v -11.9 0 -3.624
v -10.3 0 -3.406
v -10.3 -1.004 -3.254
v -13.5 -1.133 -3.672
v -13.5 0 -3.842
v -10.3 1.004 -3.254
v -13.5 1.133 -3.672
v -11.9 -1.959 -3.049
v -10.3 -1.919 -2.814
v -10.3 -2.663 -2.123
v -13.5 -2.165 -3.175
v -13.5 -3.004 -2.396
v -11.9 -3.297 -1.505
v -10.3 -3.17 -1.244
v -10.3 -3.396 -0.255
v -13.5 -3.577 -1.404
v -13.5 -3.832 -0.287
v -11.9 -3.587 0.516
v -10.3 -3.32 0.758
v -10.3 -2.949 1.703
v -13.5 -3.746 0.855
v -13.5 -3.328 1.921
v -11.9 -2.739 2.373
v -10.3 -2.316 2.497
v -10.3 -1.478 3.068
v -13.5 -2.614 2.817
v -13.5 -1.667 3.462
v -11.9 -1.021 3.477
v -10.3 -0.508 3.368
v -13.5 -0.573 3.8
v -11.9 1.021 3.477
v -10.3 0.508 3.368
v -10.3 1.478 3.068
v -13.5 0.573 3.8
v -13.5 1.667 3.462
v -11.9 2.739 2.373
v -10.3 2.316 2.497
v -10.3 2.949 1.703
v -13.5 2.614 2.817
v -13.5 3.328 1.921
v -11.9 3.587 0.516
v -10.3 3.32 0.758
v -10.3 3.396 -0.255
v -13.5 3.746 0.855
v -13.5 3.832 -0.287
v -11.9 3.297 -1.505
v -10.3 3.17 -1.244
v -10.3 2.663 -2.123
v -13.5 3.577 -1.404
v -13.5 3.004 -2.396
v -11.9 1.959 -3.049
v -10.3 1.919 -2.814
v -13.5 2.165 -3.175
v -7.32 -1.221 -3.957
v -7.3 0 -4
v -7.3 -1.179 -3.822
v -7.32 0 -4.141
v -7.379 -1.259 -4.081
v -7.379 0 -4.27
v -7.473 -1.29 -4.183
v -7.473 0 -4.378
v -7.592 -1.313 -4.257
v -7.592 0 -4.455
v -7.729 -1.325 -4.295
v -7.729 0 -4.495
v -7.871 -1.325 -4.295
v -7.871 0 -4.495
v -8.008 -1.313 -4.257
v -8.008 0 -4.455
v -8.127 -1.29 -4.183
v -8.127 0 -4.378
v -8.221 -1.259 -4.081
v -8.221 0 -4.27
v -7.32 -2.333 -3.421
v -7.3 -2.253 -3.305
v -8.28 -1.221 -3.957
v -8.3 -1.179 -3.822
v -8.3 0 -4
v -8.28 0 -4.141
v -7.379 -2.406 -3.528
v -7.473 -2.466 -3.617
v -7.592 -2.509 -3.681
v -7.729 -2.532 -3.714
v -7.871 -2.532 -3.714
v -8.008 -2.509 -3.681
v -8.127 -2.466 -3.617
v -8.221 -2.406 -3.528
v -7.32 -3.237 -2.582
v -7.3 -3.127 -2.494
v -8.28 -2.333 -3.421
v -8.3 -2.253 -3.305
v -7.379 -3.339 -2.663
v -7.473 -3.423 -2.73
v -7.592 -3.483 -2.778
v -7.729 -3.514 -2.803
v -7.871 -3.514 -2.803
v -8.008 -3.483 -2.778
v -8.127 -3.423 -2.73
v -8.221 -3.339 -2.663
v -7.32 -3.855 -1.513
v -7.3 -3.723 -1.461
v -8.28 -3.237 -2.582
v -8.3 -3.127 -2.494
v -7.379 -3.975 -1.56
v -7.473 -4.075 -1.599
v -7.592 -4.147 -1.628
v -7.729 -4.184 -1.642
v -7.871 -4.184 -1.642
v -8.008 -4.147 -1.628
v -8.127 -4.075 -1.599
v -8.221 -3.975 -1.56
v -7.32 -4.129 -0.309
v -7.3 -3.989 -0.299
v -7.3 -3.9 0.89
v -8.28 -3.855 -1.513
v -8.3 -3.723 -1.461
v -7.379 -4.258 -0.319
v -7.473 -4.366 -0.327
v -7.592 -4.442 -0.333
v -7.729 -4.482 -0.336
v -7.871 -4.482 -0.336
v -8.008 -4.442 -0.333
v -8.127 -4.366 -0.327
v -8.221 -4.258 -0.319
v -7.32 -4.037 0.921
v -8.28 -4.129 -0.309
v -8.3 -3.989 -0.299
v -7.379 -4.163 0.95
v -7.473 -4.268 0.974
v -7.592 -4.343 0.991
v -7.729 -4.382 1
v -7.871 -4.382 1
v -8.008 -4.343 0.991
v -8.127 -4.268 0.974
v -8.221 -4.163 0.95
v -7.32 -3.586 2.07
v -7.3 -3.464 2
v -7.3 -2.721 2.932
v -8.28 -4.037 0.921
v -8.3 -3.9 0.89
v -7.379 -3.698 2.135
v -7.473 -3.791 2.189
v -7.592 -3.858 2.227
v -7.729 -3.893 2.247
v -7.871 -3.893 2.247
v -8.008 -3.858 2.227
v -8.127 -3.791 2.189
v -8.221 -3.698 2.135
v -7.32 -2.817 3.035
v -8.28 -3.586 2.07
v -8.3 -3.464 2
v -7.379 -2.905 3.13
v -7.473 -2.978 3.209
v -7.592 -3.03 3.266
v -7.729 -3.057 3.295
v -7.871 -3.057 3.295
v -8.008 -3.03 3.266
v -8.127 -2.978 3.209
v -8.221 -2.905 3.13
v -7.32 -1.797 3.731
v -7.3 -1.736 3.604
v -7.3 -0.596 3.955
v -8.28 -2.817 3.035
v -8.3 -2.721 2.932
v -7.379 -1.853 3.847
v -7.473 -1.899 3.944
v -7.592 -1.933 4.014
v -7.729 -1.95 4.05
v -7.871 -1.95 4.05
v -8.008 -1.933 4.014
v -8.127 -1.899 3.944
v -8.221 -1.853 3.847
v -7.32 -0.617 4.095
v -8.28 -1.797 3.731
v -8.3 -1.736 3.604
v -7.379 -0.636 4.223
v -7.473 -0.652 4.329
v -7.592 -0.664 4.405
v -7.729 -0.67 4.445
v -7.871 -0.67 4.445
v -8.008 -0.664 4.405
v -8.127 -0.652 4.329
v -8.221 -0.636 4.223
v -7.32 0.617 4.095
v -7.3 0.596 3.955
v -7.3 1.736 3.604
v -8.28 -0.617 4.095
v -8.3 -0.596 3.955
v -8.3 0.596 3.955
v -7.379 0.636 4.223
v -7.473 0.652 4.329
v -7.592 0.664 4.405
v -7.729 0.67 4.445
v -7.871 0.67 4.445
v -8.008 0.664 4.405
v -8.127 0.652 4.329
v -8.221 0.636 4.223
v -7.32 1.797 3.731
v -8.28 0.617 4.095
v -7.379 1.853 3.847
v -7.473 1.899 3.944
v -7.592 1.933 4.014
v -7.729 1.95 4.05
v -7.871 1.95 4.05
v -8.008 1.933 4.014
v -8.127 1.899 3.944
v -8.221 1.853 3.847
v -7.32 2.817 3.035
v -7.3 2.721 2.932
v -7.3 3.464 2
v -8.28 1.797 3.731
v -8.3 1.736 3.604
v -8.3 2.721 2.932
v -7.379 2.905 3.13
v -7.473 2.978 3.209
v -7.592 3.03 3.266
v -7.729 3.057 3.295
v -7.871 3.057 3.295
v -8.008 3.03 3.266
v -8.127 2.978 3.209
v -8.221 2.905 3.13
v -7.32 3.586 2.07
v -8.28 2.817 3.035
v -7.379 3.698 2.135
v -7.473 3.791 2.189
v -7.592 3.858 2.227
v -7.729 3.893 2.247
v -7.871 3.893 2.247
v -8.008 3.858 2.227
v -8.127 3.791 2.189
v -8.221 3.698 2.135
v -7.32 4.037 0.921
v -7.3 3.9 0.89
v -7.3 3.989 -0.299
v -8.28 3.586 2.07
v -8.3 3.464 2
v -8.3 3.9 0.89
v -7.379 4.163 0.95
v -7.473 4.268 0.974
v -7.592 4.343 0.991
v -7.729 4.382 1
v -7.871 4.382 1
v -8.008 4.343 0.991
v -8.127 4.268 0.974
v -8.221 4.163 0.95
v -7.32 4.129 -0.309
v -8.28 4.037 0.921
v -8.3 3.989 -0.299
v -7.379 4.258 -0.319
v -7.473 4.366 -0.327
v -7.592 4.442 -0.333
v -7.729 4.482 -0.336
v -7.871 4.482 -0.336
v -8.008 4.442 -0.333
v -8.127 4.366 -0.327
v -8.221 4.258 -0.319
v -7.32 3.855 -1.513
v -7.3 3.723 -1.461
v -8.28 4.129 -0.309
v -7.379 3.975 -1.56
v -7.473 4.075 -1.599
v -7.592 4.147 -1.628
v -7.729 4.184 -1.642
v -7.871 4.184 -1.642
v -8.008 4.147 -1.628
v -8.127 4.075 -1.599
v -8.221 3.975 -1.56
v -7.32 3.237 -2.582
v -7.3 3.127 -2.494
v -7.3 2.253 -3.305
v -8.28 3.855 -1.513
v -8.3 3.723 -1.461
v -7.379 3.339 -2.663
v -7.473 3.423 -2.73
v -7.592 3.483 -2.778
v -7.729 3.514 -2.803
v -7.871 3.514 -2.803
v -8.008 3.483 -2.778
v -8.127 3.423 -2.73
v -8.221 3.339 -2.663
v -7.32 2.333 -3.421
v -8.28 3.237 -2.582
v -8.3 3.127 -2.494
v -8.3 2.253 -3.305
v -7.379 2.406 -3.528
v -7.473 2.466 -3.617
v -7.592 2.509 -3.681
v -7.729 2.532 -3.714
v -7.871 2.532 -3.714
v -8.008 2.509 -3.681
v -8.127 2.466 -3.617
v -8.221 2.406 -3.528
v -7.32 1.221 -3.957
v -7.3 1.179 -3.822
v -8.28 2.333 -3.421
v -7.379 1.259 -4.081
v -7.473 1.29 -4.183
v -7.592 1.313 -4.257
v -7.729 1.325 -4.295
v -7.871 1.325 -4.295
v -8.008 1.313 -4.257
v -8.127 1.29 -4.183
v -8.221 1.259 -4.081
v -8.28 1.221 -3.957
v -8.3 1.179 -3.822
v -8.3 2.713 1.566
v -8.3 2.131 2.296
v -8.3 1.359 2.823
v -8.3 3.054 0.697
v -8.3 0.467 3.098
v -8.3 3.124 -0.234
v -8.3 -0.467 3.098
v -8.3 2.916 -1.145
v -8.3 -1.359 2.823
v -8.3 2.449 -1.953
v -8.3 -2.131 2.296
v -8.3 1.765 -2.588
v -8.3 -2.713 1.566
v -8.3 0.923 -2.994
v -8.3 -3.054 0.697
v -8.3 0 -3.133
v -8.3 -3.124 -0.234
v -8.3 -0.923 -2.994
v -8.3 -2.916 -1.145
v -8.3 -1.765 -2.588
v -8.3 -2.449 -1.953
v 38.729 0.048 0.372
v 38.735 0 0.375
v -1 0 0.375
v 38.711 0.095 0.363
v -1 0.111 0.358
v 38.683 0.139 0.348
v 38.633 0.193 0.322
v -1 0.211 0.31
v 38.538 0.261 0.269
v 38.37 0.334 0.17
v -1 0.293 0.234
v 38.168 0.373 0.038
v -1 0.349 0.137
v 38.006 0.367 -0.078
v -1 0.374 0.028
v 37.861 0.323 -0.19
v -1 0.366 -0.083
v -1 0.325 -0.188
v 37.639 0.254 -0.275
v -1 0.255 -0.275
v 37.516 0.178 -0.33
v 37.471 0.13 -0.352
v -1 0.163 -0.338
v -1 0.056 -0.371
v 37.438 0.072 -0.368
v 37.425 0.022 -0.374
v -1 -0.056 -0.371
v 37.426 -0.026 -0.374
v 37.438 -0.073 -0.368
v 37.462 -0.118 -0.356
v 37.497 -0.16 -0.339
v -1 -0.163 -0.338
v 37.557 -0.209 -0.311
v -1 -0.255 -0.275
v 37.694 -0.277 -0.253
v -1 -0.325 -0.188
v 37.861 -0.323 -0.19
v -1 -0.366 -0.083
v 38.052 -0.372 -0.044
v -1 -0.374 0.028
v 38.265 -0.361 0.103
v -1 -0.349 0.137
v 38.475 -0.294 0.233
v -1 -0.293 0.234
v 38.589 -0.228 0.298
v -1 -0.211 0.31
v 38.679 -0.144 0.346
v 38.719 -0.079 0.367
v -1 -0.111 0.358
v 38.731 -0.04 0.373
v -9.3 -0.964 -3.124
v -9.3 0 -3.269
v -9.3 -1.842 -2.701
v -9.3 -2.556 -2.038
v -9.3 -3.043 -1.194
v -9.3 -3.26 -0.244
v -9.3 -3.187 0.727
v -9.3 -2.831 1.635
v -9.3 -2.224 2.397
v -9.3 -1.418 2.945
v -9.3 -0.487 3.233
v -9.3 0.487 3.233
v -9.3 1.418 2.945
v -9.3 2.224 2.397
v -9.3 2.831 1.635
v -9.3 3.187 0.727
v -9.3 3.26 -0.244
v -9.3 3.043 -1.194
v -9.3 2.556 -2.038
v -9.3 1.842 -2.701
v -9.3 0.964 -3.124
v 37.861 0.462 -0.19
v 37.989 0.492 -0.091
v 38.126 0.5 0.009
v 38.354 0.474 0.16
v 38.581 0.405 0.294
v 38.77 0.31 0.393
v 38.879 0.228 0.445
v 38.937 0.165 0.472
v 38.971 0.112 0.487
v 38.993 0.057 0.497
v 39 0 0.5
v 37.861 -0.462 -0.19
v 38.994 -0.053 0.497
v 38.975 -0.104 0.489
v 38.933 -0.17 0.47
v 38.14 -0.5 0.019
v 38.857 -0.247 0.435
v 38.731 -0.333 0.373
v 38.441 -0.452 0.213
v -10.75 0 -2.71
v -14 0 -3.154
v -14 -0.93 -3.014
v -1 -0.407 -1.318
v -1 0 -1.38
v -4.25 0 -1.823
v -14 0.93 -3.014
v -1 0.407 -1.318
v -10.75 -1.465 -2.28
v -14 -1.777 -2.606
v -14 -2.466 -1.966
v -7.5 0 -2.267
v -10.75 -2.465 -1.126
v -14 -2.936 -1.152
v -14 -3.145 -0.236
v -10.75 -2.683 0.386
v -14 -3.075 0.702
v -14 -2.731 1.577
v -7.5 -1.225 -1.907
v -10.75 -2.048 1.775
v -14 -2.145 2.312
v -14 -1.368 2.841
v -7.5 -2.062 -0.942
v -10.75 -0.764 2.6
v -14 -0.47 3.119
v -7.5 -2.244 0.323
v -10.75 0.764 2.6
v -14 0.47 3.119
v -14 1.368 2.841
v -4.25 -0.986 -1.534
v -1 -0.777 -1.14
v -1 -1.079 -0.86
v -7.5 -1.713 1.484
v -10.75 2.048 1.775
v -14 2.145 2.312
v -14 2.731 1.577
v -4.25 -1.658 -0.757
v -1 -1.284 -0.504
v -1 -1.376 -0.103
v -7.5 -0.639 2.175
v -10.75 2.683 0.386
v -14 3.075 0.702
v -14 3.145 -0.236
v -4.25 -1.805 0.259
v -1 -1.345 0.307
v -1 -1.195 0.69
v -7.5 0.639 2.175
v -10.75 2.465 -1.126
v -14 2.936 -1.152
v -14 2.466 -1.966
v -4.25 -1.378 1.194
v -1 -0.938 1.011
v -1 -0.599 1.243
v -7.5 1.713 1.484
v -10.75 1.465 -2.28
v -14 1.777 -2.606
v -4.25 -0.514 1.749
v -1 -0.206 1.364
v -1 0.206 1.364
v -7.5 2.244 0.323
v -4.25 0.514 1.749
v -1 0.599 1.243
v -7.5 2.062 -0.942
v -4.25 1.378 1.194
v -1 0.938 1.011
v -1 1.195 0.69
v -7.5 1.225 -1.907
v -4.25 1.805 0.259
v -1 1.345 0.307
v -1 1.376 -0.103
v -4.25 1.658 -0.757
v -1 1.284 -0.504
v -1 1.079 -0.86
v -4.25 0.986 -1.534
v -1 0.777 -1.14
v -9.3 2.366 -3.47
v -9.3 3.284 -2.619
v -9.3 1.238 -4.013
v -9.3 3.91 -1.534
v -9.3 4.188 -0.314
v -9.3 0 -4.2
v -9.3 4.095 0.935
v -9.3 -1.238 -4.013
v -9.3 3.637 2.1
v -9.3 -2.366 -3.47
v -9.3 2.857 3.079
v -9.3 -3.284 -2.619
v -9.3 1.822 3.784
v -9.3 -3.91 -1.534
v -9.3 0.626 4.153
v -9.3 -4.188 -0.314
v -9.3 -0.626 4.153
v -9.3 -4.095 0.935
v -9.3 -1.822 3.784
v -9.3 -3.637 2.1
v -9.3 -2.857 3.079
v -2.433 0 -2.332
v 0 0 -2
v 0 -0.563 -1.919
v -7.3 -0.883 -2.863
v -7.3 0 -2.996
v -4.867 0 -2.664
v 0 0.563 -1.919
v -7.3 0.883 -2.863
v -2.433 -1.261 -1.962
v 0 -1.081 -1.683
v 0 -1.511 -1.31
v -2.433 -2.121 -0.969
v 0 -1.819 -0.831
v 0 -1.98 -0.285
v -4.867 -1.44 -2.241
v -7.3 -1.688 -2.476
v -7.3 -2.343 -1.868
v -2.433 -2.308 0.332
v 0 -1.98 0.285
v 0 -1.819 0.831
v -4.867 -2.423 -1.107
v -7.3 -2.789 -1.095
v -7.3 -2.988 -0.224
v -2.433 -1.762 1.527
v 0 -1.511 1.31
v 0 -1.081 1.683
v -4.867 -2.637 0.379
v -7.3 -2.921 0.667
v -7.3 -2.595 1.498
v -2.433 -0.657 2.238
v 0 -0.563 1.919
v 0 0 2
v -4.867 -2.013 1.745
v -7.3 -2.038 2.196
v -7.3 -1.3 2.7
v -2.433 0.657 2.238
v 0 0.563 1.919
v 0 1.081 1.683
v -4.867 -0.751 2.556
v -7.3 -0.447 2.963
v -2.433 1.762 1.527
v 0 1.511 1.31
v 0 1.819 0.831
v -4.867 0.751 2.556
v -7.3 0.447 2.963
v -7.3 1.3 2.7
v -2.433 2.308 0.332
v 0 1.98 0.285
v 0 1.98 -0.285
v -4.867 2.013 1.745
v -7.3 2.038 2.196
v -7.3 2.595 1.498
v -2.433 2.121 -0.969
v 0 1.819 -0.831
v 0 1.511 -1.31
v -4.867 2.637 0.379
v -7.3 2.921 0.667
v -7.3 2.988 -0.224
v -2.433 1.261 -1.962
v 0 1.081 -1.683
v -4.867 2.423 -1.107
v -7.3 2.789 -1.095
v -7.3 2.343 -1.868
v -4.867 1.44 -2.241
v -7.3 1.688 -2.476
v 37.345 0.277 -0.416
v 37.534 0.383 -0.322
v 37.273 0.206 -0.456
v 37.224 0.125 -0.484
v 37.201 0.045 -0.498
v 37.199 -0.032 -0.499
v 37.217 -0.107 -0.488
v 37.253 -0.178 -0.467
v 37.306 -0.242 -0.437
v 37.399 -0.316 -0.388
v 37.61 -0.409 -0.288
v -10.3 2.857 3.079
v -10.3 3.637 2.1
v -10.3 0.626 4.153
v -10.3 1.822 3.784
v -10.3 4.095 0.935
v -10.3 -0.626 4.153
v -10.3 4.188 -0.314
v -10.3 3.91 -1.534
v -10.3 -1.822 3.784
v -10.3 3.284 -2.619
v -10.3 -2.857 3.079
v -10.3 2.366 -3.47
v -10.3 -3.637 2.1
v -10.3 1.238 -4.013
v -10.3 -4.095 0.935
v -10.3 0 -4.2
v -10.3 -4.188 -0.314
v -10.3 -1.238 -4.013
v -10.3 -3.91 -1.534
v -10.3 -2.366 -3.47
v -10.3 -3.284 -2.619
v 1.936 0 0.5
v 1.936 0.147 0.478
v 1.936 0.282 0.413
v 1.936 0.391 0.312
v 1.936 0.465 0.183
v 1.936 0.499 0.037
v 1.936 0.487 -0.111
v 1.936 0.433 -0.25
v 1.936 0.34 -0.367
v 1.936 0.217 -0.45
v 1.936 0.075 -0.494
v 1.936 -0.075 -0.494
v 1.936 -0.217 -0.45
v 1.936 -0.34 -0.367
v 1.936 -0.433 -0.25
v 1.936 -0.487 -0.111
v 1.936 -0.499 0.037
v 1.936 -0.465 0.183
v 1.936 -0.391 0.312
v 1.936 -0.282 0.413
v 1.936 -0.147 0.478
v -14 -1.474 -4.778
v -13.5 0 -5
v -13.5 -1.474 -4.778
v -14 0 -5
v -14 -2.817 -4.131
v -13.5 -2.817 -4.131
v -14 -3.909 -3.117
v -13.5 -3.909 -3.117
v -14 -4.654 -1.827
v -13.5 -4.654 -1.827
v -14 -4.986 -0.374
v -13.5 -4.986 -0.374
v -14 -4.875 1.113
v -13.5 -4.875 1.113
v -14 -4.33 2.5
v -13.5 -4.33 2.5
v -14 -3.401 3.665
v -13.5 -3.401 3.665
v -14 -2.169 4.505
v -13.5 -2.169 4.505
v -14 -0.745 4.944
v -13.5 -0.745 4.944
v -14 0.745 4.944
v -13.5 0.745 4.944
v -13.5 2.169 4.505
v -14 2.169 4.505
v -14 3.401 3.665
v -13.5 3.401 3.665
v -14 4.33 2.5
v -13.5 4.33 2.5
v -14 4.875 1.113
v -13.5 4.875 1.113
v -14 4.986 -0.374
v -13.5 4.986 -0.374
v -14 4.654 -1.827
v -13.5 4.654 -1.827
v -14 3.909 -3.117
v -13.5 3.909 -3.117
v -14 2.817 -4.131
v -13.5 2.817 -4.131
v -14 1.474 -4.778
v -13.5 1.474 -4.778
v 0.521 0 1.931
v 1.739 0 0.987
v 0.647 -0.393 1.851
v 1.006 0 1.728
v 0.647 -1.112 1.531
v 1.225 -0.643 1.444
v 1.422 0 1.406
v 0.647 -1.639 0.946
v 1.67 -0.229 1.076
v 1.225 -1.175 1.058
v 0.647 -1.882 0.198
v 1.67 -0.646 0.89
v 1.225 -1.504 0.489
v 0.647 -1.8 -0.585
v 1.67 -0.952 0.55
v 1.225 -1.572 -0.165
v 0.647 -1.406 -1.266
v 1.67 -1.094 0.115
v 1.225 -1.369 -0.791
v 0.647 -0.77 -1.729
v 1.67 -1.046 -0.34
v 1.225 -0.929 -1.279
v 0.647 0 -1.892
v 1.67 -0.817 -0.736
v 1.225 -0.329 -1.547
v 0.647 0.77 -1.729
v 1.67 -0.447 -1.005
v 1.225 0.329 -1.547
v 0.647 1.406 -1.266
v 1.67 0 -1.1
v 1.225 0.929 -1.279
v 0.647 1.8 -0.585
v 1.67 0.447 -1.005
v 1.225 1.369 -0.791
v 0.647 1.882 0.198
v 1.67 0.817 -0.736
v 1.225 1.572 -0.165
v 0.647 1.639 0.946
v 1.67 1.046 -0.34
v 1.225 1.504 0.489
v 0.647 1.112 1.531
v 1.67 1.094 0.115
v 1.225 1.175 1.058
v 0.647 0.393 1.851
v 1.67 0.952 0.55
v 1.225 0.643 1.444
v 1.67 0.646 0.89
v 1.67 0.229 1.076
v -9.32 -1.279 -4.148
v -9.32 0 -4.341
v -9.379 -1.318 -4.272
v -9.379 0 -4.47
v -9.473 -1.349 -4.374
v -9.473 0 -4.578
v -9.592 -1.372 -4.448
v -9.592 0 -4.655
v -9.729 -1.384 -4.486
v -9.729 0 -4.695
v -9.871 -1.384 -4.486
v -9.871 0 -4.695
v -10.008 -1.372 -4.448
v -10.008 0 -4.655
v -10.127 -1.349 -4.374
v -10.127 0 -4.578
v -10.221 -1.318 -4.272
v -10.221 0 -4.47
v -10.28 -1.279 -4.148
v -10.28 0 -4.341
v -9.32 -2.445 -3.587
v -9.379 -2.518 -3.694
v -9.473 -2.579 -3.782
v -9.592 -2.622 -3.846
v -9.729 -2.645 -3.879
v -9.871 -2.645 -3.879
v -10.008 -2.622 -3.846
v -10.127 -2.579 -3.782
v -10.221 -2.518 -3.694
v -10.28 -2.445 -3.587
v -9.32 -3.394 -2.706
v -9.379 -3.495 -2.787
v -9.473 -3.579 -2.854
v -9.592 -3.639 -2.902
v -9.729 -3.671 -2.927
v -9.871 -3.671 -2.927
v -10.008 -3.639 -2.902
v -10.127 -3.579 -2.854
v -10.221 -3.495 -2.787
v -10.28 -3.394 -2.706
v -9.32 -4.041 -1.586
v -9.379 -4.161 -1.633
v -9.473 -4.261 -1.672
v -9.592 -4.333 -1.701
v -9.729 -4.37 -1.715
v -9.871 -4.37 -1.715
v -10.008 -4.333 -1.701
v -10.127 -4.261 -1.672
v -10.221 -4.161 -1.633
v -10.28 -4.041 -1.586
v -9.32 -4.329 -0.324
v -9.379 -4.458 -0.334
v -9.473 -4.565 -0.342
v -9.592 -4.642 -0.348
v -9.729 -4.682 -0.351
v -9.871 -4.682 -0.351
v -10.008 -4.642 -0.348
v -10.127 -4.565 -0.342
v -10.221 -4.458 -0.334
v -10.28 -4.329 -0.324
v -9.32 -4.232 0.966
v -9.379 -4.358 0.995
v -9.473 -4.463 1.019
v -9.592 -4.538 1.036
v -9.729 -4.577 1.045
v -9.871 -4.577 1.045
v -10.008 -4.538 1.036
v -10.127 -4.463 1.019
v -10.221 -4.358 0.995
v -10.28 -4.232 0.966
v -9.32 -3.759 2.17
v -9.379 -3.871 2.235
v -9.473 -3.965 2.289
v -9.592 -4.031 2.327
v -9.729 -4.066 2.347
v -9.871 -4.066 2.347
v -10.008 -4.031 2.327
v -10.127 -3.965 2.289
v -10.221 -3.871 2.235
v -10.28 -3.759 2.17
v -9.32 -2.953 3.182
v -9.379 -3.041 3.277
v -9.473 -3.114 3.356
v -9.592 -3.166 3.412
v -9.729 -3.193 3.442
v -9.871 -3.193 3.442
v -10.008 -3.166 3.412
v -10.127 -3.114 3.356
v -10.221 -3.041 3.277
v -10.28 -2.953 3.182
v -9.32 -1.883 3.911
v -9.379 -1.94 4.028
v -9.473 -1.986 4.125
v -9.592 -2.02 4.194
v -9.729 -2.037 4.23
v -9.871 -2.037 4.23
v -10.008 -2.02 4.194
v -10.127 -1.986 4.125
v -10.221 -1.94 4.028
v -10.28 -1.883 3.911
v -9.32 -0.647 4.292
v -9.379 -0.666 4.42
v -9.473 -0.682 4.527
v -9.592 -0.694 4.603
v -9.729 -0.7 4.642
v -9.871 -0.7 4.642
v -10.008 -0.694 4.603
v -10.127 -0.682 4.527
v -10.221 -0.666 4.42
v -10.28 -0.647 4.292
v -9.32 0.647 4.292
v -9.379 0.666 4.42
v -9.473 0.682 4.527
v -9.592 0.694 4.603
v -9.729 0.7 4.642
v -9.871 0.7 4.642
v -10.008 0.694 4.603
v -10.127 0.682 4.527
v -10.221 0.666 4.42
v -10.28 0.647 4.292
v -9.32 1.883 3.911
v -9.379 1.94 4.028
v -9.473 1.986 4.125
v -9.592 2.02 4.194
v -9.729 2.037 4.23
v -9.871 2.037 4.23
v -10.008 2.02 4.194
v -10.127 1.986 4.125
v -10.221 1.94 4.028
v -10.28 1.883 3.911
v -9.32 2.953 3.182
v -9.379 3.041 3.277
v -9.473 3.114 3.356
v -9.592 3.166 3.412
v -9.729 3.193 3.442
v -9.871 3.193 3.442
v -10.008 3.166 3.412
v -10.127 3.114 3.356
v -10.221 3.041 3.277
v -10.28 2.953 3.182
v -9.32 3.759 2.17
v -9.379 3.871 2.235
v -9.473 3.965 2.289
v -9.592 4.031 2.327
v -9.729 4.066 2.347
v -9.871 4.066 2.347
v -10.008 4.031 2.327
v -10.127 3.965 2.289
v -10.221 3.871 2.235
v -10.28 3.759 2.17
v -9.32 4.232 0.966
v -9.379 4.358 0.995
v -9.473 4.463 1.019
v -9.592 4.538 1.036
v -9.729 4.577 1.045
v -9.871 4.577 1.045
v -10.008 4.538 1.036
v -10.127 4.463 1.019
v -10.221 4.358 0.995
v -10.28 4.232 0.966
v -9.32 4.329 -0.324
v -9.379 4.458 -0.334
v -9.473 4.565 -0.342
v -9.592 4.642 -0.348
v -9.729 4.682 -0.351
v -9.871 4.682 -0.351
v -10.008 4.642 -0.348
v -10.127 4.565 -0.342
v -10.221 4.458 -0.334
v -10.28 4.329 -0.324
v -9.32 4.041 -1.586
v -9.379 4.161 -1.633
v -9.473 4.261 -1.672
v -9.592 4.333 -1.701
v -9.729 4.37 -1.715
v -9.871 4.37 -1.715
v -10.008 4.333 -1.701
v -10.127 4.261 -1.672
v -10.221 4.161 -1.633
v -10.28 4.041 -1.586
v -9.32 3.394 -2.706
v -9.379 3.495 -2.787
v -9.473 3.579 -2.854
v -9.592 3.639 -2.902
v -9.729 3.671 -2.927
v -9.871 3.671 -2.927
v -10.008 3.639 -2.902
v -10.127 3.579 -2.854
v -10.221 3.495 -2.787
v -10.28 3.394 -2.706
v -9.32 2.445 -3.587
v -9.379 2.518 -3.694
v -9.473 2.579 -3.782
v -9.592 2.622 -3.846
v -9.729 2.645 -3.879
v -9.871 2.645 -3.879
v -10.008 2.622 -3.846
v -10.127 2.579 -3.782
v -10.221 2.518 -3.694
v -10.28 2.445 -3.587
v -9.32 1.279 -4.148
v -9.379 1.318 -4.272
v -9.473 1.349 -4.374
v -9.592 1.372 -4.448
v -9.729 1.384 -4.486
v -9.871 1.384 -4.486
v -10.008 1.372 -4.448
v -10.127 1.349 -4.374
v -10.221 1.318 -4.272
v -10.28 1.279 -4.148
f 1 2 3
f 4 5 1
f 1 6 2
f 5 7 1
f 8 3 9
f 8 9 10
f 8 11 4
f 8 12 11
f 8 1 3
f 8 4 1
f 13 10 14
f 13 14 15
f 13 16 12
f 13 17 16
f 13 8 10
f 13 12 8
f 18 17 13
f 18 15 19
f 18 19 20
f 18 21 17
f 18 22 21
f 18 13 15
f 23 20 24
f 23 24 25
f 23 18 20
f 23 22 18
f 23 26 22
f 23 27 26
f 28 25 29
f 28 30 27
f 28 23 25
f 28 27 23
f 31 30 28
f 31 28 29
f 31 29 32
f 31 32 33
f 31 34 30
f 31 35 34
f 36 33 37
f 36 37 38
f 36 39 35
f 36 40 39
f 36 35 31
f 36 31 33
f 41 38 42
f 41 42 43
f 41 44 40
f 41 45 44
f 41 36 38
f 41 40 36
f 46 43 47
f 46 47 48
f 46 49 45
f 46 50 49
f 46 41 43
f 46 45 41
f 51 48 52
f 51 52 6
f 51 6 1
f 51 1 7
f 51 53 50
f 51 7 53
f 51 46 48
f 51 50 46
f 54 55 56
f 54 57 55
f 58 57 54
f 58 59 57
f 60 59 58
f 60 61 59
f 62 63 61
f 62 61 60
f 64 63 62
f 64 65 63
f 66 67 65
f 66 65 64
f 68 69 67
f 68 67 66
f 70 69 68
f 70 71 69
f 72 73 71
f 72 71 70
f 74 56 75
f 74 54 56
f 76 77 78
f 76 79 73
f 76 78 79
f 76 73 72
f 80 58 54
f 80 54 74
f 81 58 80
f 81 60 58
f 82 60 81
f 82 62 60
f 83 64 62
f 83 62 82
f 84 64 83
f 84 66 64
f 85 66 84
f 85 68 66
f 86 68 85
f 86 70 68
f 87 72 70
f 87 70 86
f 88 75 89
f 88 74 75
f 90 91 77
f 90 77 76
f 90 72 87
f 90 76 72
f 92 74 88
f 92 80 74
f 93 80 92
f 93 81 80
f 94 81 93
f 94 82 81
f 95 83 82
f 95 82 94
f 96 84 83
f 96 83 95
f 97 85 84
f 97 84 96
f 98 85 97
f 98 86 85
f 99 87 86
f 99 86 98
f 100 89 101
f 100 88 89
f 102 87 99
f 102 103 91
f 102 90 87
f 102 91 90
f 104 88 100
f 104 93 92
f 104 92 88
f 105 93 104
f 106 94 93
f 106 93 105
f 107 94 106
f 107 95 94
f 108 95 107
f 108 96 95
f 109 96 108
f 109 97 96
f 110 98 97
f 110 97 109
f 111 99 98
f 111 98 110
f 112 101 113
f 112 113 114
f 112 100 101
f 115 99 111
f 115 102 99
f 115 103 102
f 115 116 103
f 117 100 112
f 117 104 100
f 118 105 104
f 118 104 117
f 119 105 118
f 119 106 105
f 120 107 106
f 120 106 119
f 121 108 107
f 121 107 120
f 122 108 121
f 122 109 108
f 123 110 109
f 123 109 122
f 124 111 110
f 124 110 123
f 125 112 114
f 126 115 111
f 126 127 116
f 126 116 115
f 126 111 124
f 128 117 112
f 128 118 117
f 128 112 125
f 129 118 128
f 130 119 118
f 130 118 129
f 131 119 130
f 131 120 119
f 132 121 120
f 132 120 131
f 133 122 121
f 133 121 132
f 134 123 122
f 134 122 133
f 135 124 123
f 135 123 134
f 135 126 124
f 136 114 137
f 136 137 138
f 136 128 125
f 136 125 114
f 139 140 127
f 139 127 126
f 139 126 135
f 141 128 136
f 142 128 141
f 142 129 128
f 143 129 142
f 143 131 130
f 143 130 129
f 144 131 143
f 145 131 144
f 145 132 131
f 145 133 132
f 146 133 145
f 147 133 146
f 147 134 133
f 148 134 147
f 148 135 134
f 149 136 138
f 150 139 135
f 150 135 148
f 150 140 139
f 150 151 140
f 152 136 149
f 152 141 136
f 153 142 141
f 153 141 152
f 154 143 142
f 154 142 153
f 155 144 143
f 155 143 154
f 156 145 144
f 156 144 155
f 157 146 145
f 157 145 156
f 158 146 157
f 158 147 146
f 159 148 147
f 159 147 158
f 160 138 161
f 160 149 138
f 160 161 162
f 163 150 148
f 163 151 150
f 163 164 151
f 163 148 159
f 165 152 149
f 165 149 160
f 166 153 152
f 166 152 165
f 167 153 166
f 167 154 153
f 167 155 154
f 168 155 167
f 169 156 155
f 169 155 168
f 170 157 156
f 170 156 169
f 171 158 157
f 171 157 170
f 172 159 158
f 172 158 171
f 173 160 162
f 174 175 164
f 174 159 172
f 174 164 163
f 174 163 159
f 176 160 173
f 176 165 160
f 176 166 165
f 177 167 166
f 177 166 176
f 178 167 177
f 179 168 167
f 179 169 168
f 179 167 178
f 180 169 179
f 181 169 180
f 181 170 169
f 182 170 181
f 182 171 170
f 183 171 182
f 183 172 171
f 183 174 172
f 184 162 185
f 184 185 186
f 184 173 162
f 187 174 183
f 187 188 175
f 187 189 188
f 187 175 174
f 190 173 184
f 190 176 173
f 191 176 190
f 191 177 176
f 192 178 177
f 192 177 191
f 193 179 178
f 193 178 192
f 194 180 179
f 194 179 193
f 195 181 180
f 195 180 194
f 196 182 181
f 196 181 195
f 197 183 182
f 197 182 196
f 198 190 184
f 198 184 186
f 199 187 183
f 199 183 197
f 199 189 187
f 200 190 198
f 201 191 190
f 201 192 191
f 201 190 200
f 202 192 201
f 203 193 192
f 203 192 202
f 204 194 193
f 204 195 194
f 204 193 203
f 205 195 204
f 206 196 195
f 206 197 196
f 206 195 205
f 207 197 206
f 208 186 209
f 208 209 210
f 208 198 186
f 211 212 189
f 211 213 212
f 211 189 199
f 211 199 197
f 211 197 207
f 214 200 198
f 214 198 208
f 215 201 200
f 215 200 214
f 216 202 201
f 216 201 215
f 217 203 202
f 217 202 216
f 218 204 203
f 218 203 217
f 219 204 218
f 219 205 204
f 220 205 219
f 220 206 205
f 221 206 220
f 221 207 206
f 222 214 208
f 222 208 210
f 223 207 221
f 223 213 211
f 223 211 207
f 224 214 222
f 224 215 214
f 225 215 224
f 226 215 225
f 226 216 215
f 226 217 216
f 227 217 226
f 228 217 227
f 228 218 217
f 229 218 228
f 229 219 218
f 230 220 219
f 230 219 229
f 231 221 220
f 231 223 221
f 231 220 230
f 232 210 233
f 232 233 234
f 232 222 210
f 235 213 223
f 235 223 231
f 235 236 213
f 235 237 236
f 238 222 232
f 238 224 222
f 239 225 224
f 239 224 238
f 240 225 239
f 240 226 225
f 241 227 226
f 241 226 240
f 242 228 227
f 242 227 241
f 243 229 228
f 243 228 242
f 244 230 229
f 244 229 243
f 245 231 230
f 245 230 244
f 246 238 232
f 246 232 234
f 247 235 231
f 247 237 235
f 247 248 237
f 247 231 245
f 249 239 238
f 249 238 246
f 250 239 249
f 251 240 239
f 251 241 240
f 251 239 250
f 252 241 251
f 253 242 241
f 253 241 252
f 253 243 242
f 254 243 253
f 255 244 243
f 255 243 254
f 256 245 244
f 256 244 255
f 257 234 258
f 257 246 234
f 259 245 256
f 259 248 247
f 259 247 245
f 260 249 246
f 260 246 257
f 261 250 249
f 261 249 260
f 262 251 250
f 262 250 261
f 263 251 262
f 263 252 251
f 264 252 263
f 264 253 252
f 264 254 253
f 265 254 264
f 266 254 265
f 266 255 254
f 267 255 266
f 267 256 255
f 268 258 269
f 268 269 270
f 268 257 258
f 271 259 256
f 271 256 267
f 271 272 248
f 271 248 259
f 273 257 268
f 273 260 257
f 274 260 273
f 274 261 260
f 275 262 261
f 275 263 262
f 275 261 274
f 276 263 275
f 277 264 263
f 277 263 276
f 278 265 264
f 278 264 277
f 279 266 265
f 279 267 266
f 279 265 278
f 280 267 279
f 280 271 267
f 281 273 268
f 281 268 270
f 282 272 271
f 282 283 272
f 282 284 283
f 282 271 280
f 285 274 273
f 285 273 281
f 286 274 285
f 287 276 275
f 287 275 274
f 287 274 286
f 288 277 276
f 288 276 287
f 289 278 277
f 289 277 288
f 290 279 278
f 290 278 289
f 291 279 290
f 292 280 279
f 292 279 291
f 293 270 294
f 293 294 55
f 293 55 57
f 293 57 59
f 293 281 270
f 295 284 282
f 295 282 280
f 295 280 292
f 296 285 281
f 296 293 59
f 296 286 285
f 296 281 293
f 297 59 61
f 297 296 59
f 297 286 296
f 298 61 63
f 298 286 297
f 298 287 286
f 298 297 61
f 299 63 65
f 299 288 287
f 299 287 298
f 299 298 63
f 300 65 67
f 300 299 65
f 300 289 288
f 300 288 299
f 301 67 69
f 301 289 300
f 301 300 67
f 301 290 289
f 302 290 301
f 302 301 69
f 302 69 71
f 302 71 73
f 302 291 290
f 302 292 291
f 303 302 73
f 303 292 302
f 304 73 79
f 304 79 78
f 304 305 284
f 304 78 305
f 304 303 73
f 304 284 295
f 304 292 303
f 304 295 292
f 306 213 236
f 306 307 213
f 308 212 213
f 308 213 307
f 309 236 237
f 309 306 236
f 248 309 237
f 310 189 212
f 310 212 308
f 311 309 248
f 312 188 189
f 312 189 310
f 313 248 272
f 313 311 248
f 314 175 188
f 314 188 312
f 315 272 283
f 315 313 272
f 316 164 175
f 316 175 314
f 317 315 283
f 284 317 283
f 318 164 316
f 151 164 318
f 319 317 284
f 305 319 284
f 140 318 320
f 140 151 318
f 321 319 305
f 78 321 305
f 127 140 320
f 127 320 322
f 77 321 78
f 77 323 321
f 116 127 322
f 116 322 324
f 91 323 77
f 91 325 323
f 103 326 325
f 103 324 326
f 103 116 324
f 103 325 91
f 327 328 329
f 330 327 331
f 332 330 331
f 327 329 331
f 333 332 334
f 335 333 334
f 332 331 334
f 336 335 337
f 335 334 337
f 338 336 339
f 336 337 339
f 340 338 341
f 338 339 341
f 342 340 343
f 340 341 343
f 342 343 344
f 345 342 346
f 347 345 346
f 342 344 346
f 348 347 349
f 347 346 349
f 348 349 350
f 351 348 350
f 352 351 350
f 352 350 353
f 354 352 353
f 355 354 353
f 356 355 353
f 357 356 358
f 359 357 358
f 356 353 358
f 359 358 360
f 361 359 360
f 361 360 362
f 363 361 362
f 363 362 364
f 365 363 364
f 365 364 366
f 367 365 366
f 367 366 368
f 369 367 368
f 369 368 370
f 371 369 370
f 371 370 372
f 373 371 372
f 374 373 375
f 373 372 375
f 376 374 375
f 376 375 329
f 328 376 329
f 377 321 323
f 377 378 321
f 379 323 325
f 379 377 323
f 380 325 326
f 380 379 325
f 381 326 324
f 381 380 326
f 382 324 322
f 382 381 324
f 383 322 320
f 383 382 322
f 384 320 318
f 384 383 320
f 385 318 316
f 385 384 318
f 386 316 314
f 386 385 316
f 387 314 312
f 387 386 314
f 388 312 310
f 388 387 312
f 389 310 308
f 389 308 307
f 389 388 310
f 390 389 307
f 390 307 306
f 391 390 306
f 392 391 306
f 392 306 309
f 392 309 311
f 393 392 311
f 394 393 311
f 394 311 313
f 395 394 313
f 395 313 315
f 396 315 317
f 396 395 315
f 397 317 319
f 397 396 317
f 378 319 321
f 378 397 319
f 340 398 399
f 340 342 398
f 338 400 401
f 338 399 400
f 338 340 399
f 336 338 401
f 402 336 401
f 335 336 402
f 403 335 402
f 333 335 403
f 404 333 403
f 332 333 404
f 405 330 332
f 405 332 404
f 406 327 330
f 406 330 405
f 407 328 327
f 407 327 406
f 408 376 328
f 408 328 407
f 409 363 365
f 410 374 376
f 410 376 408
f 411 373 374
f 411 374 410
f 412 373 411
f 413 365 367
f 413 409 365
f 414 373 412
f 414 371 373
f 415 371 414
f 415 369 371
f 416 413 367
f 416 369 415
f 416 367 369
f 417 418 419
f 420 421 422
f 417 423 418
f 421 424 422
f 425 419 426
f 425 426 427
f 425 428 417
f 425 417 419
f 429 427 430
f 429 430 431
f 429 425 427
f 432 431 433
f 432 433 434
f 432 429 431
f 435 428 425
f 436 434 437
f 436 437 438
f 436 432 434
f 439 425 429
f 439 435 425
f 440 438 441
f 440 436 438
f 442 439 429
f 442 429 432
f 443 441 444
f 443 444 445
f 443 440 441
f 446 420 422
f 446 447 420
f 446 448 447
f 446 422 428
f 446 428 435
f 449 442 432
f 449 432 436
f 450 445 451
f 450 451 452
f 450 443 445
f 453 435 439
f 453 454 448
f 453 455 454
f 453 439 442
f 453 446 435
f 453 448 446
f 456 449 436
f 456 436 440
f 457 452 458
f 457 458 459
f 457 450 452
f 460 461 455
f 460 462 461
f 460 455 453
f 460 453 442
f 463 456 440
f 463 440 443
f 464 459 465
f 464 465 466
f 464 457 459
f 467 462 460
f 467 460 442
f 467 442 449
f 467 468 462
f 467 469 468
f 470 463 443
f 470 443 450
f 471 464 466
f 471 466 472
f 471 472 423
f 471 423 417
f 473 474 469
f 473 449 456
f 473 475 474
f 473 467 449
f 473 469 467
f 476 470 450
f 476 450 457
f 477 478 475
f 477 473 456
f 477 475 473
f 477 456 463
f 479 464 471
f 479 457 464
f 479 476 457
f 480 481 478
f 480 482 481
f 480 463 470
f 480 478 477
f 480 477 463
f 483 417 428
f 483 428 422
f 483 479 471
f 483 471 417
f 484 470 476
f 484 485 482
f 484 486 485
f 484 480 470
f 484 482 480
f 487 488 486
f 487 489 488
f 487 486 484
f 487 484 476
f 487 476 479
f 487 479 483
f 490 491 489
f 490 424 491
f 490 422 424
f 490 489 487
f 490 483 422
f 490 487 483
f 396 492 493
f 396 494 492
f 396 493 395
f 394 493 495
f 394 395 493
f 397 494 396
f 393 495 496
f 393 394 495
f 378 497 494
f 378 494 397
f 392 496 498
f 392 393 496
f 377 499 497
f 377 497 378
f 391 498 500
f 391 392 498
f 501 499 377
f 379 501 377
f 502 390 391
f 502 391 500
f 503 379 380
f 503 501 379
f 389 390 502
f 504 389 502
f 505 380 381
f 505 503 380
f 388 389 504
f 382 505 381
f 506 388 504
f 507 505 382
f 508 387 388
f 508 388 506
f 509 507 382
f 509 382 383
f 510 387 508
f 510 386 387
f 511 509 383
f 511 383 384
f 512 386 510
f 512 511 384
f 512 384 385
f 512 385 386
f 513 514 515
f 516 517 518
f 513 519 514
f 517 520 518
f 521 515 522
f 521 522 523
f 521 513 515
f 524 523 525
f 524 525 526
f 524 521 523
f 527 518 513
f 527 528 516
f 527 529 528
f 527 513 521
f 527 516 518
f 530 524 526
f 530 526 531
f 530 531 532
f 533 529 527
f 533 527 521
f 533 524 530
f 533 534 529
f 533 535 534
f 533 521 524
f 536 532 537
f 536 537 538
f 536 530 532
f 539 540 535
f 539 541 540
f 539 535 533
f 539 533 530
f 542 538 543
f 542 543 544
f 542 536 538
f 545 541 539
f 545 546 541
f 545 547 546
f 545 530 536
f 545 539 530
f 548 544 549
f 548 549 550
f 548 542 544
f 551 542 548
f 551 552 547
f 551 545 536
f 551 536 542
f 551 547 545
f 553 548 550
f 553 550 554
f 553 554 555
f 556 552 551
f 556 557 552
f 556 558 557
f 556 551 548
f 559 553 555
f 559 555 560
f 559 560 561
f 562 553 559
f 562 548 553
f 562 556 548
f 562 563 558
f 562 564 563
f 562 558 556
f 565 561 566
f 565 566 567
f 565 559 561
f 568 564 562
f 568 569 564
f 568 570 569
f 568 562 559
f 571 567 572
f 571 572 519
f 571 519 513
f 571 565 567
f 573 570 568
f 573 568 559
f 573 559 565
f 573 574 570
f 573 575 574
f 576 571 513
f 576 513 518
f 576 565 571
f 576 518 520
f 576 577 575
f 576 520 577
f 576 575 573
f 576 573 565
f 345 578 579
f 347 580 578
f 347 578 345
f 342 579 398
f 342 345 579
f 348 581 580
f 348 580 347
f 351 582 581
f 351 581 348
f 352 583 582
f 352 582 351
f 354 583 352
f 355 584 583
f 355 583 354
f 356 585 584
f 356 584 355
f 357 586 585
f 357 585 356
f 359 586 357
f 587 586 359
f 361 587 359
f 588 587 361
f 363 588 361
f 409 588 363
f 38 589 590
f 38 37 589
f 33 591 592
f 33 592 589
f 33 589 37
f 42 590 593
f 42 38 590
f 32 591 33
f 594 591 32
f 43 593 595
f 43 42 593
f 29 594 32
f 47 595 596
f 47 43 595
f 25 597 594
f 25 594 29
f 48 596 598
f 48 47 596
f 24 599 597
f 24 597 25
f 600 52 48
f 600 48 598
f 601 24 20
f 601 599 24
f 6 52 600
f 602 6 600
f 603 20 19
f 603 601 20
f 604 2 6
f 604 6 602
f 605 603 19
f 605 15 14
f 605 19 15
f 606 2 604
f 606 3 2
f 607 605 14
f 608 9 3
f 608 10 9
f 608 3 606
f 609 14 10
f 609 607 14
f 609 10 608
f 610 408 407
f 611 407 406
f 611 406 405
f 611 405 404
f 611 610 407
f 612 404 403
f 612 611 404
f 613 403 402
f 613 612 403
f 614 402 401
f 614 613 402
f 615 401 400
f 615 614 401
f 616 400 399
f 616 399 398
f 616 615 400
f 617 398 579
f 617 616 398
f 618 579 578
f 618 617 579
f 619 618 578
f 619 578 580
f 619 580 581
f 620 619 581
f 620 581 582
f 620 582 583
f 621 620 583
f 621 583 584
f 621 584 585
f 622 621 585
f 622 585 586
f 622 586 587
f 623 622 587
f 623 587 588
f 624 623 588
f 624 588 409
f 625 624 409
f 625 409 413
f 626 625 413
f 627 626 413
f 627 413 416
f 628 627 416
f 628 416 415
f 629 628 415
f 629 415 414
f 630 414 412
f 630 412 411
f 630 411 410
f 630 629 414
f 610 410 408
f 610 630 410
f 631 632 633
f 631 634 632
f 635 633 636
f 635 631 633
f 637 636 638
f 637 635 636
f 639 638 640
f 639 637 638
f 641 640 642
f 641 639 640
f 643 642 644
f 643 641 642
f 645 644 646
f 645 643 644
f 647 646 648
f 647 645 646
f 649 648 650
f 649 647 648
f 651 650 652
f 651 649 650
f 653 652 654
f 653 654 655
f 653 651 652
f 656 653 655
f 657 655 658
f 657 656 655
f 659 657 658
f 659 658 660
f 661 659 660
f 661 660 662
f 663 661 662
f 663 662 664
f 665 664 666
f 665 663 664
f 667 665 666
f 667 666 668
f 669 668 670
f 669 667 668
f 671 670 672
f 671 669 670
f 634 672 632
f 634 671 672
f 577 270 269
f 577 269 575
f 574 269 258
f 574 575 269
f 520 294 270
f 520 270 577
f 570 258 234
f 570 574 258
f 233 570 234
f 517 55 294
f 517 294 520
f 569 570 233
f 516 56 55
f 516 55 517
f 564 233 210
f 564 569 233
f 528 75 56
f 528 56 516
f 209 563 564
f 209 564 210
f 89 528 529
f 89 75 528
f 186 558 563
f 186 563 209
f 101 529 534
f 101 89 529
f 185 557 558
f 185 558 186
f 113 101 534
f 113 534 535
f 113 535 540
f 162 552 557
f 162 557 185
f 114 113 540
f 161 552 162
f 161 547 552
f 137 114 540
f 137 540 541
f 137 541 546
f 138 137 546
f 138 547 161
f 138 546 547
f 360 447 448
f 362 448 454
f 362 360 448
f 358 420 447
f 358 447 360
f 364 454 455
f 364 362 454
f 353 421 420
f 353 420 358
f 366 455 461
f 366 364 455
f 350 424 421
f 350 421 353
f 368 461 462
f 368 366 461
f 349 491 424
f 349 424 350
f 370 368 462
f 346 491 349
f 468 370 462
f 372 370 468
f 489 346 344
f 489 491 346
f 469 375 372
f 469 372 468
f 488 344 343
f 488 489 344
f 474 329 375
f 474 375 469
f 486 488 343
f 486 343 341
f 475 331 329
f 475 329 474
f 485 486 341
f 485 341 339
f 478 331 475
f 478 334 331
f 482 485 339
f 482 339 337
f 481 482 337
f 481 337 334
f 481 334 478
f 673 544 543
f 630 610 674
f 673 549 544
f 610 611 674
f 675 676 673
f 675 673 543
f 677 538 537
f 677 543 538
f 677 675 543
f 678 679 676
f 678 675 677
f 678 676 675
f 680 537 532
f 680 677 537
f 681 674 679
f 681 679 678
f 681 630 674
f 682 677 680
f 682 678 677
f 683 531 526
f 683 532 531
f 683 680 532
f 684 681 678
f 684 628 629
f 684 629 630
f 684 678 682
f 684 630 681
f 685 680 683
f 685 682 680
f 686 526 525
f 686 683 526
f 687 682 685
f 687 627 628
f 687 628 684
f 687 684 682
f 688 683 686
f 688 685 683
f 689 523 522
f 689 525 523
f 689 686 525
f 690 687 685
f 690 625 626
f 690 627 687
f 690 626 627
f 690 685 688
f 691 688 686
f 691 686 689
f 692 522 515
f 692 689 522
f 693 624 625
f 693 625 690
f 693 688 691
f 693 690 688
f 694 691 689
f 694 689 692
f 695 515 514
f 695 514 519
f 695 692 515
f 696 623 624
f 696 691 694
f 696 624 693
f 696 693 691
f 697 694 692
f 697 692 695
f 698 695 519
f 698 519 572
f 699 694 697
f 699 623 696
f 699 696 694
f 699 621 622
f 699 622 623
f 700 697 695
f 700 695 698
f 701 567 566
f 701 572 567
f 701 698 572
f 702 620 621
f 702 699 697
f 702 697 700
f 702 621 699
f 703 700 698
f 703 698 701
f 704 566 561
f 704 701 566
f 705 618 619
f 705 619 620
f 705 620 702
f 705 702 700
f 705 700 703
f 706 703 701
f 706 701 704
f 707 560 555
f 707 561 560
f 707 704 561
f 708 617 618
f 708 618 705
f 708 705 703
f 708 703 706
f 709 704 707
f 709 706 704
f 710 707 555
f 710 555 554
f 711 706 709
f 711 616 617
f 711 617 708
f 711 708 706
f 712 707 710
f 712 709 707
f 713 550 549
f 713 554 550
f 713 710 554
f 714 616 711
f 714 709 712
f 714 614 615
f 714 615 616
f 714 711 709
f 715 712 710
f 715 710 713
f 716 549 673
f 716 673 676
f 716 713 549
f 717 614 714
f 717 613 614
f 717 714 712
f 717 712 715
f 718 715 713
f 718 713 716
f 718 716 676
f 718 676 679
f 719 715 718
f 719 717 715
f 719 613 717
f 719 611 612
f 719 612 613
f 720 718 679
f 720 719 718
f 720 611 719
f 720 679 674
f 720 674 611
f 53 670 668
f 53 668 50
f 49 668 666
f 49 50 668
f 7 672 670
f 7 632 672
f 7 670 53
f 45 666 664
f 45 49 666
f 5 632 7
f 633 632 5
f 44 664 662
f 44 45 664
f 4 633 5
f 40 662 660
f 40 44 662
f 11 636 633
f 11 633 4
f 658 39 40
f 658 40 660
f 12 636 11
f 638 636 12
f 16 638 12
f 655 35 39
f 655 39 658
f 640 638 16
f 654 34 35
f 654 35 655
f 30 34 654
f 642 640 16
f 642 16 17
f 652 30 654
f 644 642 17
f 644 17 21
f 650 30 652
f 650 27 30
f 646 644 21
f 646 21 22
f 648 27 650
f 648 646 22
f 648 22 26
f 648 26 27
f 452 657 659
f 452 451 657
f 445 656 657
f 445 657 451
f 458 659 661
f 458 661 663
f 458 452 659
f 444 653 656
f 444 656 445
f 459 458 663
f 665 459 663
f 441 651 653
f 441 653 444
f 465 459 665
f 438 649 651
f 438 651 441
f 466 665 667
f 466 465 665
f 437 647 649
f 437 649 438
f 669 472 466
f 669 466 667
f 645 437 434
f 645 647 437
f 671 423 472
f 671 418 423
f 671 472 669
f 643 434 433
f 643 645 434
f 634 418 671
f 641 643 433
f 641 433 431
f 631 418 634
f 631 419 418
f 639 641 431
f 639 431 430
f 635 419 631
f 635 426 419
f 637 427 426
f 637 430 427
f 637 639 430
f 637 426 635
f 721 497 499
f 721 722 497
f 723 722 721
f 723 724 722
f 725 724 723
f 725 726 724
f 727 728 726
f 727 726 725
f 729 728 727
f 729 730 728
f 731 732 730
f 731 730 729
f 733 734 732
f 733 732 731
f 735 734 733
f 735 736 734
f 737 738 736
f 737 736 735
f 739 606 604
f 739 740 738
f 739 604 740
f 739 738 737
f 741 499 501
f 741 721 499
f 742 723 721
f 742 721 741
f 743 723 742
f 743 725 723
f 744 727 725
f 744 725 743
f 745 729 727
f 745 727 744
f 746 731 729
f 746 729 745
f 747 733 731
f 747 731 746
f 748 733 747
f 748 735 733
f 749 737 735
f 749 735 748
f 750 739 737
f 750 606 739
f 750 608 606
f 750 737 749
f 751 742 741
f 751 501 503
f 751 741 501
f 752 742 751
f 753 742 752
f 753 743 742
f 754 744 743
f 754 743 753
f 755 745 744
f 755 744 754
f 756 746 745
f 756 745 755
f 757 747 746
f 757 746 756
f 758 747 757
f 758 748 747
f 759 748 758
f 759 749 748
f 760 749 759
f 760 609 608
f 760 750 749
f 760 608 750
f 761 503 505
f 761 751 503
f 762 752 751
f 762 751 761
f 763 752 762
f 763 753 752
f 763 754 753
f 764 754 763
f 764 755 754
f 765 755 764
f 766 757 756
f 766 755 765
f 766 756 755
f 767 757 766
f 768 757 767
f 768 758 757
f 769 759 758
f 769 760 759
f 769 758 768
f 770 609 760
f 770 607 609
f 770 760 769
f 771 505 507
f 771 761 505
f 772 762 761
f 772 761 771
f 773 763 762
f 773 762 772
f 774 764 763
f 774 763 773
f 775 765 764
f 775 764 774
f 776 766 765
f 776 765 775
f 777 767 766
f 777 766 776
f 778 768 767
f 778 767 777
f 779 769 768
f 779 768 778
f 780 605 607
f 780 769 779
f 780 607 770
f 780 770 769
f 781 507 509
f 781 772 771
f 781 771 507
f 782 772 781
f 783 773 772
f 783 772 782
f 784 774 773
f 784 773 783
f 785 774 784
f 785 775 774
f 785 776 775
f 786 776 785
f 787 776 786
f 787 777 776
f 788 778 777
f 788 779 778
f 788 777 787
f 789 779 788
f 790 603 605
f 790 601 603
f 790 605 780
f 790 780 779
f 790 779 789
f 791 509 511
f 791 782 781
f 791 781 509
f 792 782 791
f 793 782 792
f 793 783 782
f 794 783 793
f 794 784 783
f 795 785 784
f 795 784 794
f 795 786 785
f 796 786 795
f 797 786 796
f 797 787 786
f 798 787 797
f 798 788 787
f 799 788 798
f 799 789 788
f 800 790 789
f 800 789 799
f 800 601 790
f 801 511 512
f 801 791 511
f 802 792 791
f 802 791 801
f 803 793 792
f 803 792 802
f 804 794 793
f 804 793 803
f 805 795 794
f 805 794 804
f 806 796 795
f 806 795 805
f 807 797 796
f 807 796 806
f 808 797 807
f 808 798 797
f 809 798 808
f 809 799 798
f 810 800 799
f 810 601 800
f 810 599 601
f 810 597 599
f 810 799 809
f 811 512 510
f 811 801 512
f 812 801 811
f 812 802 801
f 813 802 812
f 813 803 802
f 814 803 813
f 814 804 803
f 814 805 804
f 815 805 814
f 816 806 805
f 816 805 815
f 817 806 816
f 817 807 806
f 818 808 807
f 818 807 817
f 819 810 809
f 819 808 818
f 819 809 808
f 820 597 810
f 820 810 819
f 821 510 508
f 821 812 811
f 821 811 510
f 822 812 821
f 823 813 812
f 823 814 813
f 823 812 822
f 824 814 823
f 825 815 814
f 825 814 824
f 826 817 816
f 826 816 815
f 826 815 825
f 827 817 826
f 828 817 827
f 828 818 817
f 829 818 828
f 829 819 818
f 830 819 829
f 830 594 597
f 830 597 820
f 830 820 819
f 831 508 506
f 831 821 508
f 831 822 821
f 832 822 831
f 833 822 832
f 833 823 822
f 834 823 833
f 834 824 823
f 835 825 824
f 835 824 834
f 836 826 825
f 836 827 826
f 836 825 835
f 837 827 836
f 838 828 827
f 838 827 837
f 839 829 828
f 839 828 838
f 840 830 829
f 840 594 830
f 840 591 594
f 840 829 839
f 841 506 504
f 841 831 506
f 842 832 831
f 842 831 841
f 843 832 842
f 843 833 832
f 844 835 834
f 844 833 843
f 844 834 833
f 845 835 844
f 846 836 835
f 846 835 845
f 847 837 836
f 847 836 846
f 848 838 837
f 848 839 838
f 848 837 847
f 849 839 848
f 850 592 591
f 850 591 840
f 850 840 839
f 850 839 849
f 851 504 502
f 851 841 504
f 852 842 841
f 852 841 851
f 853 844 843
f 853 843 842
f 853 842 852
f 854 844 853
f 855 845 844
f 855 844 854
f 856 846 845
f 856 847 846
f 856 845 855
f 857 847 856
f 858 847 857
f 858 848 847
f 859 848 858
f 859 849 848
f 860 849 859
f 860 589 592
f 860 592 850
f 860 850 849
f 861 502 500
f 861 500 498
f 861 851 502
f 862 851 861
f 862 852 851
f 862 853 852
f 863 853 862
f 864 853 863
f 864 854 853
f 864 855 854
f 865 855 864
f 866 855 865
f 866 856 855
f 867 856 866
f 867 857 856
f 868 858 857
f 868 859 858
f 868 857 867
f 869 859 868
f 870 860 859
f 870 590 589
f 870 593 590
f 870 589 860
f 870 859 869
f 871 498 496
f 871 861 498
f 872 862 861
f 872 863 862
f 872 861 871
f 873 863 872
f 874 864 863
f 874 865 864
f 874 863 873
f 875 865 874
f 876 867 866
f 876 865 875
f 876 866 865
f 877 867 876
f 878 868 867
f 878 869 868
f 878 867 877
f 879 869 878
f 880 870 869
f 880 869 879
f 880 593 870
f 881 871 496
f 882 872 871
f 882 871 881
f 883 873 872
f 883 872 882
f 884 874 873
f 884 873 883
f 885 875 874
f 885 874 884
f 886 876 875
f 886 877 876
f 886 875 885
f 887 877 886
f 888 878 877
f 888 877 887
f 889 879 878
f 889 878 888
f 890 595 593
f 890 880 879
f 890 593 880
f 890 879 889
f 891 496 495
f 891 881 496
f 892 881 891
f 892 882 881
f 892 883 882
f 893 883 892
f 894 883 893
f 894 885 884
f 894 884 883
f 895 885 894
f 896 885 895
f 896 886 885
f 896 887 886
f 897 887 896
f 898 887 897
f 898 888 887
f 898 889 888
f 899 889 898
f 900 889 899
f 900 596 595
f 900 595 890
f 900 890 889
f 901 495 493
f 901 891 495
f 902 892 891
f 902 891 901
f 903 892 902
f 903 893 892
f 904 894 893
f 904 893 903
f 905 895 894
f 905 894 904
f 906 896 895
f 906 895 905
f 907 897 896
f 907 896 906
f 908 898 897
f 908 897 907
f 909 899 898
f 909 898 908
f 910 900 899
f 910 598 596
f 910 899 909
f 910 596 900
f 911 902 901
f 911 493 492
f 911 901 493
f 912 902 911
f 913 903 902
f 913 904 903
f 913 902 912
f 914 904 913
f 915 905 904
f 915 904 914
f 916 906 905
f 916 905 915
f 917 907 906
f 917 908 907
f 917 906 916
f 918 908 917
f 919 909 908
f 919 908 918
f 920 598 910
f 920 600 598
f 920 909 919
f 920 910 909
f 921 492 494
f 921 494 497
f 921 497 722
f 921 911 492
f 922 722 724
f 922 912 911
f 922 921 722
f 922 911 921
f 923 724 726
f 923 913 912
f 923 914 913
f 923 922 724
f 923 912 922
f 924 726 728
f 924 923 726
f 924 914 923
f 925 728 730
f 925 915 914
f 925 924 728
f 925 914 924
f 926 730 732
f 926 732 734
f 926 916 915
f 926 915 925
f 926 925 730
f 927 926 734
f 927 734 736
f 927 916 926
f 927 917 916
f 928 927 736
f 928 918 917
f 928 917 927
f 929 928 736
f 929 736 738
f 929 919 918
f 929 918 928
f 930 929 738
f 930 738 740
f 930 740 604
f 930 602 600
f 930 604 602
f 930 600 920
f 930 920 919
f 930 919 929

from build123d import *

# Parameters (mm, degrees)
DOME1_FACE_RADIUS       = 2
DOME1_HEIGHT            = 2
SKETCH2_R               = 0.5
CUT_EXTRUDE1_DEPTH      = 15.798648587
SKETCH3_R               = 0.5
SKETCH3_R_2             = 0.375
EXTRUDE_THIN1_DEPTH     = 40
CUT_EXTRUDE2_DEPTH      = 40.635842365
CUT_EXTRUDE2_DEPTH_BACK = 40.635842365
SKETCH4_R               = 3.5
CUT_EXTRUDE4_DEPTH      = 40.635842464
CUT_EXTRUDE4_DEPTH_BACK = 40.635842464
SKETCH5_R               = 5


with BuildPart() as part:
    # Sketch1 → Revolve1 (revolve)
    with BuildSketch(Plane.XY, mode=Mode.PRIVATE) as revolve1_sk:
        with BuildLine():
            Line((0, 0), (0, 2))
            Line((0, 2), (-7.3, 2.99628656))
            Line((-7.3, 2.99628656), (-7.3, 4))
            ThreePointArc((-7.3, 4), (-7.8, 4.5), (-8.3, 4))
            Line((-8.3, 4), (-8.3, 3.132764171))
            Line((-8.3, 3.132764171), (-9.3, 3.269241782))
            Line((-9.3, 3.269241782), (-9.3, 4.2))
            ThreePointArc((-9.3, 4.2), (-9.8, 4.7), (-10.3, 4.2))
            Line((-10.3, 4.2), (-10.3, 3.405719393))
            Line((-10.3, 3.405719393), (-13.5, 3.842447748))
            Line((-13.5, 3.842447748), (-13.5, 5))
            Line((-13.5, 5), (-14, 5))
            Line((-14, 5), (-14, 3.153733977))
            Line((-14, 3.153733977), (-1, 1.379525035))
            Line((-1, 1.379525035), (-1, 0))
            Line((-1, 0), (0, 0))
        make_face()
    revolve(revolve1_sk.sketch.rotate(Axis((0, 0, 0), (-1, 0, 0)), 90), axis=Axis((0, 0, 0), (-1, 0, 0)))

    # Dome1: a dome of height H over a round flat face of radius A is a cap of a sphere of radius (A * A + H * H) / (2 * H)
    dome1_r = (DOME1_FACE_RADIUS * DOME1_FACE_RADIUS + DOME1_HEIGHT * DOME1_HEIGHT) / (2 * DOME1_HEIGHT)
    dome1_base = Plane((0, 0, 0), z_dir=(1, 0, 0))
    with Locations(dome1_base.offset(DOME1_HEIGHT - dome1_r)):
        dome1_ball = Sphere(dome1_r, mode=Mode.PRIVATE)
    add(split(dome1_ball, bisect_by=dome1_base, keep=Keep.TOP, mode=Mode.PRIVATE))

    # Sketch2 → Cut-Extrude1 (cut, through all)
    with BuildSketch(Plane.ZY.offset(1)):
        Circle(SKETCH2_R)
    extrude(amount=-CUT_EXTRUDE1_DEPTH, mode=Mode.SUBTRACT)

    # Sketch3 → Extrude-Thin1 (add)
    with BuildSketch(Plane.ZY.offset(1)):
        Circle(SKETCH3_R)
        Circle(SKETCH3_R_2, mode=Mode.SUBTRACT)
    extrude(amount=-EXTRUDE_THIN1_DEPTH)

    # Sketch4 → Cut-Extrude2 (cut, two sides: drawn at the far end of the back side and taken through both)
    with BuildSketch(Plane(origin=(0, 0, 0), x_dir=(1, 0, 0), z_dir=(0, 1, 0)).offset(-CUT_EXTRUDE2_DEPTH_BACK)):
        with Locations((39, 3.5)):
            Circle(SKETCH4_R)
    extrude(amount=CUT_EXTRUDE2_DEPTH + CUT_EXTRUDE2_DEPTH_BACK, mode=Mode.SUBTRACT)

    # Sketch5 → Cut-Extrude4 (cut, two sides: drawn at the far end of the back side and taken through both)
    with BuildSketch(Plane(origin=(0, 0, 0), x_dir=(1, 0, 0), z_dir=(0, 1, 0)).offset(-CUT_EXTRUDE4_DEPTH_BACK)):
        with Locations((41, 4.082575695)):
            Circle(SKETCH5_R)
    extrude(amount=CUT_EXTRUDE4_DEPTH + CUT_EXTRUDE4_DEPTH_BACK, mode=Mode.SUBTRACT)


solid = part.part
